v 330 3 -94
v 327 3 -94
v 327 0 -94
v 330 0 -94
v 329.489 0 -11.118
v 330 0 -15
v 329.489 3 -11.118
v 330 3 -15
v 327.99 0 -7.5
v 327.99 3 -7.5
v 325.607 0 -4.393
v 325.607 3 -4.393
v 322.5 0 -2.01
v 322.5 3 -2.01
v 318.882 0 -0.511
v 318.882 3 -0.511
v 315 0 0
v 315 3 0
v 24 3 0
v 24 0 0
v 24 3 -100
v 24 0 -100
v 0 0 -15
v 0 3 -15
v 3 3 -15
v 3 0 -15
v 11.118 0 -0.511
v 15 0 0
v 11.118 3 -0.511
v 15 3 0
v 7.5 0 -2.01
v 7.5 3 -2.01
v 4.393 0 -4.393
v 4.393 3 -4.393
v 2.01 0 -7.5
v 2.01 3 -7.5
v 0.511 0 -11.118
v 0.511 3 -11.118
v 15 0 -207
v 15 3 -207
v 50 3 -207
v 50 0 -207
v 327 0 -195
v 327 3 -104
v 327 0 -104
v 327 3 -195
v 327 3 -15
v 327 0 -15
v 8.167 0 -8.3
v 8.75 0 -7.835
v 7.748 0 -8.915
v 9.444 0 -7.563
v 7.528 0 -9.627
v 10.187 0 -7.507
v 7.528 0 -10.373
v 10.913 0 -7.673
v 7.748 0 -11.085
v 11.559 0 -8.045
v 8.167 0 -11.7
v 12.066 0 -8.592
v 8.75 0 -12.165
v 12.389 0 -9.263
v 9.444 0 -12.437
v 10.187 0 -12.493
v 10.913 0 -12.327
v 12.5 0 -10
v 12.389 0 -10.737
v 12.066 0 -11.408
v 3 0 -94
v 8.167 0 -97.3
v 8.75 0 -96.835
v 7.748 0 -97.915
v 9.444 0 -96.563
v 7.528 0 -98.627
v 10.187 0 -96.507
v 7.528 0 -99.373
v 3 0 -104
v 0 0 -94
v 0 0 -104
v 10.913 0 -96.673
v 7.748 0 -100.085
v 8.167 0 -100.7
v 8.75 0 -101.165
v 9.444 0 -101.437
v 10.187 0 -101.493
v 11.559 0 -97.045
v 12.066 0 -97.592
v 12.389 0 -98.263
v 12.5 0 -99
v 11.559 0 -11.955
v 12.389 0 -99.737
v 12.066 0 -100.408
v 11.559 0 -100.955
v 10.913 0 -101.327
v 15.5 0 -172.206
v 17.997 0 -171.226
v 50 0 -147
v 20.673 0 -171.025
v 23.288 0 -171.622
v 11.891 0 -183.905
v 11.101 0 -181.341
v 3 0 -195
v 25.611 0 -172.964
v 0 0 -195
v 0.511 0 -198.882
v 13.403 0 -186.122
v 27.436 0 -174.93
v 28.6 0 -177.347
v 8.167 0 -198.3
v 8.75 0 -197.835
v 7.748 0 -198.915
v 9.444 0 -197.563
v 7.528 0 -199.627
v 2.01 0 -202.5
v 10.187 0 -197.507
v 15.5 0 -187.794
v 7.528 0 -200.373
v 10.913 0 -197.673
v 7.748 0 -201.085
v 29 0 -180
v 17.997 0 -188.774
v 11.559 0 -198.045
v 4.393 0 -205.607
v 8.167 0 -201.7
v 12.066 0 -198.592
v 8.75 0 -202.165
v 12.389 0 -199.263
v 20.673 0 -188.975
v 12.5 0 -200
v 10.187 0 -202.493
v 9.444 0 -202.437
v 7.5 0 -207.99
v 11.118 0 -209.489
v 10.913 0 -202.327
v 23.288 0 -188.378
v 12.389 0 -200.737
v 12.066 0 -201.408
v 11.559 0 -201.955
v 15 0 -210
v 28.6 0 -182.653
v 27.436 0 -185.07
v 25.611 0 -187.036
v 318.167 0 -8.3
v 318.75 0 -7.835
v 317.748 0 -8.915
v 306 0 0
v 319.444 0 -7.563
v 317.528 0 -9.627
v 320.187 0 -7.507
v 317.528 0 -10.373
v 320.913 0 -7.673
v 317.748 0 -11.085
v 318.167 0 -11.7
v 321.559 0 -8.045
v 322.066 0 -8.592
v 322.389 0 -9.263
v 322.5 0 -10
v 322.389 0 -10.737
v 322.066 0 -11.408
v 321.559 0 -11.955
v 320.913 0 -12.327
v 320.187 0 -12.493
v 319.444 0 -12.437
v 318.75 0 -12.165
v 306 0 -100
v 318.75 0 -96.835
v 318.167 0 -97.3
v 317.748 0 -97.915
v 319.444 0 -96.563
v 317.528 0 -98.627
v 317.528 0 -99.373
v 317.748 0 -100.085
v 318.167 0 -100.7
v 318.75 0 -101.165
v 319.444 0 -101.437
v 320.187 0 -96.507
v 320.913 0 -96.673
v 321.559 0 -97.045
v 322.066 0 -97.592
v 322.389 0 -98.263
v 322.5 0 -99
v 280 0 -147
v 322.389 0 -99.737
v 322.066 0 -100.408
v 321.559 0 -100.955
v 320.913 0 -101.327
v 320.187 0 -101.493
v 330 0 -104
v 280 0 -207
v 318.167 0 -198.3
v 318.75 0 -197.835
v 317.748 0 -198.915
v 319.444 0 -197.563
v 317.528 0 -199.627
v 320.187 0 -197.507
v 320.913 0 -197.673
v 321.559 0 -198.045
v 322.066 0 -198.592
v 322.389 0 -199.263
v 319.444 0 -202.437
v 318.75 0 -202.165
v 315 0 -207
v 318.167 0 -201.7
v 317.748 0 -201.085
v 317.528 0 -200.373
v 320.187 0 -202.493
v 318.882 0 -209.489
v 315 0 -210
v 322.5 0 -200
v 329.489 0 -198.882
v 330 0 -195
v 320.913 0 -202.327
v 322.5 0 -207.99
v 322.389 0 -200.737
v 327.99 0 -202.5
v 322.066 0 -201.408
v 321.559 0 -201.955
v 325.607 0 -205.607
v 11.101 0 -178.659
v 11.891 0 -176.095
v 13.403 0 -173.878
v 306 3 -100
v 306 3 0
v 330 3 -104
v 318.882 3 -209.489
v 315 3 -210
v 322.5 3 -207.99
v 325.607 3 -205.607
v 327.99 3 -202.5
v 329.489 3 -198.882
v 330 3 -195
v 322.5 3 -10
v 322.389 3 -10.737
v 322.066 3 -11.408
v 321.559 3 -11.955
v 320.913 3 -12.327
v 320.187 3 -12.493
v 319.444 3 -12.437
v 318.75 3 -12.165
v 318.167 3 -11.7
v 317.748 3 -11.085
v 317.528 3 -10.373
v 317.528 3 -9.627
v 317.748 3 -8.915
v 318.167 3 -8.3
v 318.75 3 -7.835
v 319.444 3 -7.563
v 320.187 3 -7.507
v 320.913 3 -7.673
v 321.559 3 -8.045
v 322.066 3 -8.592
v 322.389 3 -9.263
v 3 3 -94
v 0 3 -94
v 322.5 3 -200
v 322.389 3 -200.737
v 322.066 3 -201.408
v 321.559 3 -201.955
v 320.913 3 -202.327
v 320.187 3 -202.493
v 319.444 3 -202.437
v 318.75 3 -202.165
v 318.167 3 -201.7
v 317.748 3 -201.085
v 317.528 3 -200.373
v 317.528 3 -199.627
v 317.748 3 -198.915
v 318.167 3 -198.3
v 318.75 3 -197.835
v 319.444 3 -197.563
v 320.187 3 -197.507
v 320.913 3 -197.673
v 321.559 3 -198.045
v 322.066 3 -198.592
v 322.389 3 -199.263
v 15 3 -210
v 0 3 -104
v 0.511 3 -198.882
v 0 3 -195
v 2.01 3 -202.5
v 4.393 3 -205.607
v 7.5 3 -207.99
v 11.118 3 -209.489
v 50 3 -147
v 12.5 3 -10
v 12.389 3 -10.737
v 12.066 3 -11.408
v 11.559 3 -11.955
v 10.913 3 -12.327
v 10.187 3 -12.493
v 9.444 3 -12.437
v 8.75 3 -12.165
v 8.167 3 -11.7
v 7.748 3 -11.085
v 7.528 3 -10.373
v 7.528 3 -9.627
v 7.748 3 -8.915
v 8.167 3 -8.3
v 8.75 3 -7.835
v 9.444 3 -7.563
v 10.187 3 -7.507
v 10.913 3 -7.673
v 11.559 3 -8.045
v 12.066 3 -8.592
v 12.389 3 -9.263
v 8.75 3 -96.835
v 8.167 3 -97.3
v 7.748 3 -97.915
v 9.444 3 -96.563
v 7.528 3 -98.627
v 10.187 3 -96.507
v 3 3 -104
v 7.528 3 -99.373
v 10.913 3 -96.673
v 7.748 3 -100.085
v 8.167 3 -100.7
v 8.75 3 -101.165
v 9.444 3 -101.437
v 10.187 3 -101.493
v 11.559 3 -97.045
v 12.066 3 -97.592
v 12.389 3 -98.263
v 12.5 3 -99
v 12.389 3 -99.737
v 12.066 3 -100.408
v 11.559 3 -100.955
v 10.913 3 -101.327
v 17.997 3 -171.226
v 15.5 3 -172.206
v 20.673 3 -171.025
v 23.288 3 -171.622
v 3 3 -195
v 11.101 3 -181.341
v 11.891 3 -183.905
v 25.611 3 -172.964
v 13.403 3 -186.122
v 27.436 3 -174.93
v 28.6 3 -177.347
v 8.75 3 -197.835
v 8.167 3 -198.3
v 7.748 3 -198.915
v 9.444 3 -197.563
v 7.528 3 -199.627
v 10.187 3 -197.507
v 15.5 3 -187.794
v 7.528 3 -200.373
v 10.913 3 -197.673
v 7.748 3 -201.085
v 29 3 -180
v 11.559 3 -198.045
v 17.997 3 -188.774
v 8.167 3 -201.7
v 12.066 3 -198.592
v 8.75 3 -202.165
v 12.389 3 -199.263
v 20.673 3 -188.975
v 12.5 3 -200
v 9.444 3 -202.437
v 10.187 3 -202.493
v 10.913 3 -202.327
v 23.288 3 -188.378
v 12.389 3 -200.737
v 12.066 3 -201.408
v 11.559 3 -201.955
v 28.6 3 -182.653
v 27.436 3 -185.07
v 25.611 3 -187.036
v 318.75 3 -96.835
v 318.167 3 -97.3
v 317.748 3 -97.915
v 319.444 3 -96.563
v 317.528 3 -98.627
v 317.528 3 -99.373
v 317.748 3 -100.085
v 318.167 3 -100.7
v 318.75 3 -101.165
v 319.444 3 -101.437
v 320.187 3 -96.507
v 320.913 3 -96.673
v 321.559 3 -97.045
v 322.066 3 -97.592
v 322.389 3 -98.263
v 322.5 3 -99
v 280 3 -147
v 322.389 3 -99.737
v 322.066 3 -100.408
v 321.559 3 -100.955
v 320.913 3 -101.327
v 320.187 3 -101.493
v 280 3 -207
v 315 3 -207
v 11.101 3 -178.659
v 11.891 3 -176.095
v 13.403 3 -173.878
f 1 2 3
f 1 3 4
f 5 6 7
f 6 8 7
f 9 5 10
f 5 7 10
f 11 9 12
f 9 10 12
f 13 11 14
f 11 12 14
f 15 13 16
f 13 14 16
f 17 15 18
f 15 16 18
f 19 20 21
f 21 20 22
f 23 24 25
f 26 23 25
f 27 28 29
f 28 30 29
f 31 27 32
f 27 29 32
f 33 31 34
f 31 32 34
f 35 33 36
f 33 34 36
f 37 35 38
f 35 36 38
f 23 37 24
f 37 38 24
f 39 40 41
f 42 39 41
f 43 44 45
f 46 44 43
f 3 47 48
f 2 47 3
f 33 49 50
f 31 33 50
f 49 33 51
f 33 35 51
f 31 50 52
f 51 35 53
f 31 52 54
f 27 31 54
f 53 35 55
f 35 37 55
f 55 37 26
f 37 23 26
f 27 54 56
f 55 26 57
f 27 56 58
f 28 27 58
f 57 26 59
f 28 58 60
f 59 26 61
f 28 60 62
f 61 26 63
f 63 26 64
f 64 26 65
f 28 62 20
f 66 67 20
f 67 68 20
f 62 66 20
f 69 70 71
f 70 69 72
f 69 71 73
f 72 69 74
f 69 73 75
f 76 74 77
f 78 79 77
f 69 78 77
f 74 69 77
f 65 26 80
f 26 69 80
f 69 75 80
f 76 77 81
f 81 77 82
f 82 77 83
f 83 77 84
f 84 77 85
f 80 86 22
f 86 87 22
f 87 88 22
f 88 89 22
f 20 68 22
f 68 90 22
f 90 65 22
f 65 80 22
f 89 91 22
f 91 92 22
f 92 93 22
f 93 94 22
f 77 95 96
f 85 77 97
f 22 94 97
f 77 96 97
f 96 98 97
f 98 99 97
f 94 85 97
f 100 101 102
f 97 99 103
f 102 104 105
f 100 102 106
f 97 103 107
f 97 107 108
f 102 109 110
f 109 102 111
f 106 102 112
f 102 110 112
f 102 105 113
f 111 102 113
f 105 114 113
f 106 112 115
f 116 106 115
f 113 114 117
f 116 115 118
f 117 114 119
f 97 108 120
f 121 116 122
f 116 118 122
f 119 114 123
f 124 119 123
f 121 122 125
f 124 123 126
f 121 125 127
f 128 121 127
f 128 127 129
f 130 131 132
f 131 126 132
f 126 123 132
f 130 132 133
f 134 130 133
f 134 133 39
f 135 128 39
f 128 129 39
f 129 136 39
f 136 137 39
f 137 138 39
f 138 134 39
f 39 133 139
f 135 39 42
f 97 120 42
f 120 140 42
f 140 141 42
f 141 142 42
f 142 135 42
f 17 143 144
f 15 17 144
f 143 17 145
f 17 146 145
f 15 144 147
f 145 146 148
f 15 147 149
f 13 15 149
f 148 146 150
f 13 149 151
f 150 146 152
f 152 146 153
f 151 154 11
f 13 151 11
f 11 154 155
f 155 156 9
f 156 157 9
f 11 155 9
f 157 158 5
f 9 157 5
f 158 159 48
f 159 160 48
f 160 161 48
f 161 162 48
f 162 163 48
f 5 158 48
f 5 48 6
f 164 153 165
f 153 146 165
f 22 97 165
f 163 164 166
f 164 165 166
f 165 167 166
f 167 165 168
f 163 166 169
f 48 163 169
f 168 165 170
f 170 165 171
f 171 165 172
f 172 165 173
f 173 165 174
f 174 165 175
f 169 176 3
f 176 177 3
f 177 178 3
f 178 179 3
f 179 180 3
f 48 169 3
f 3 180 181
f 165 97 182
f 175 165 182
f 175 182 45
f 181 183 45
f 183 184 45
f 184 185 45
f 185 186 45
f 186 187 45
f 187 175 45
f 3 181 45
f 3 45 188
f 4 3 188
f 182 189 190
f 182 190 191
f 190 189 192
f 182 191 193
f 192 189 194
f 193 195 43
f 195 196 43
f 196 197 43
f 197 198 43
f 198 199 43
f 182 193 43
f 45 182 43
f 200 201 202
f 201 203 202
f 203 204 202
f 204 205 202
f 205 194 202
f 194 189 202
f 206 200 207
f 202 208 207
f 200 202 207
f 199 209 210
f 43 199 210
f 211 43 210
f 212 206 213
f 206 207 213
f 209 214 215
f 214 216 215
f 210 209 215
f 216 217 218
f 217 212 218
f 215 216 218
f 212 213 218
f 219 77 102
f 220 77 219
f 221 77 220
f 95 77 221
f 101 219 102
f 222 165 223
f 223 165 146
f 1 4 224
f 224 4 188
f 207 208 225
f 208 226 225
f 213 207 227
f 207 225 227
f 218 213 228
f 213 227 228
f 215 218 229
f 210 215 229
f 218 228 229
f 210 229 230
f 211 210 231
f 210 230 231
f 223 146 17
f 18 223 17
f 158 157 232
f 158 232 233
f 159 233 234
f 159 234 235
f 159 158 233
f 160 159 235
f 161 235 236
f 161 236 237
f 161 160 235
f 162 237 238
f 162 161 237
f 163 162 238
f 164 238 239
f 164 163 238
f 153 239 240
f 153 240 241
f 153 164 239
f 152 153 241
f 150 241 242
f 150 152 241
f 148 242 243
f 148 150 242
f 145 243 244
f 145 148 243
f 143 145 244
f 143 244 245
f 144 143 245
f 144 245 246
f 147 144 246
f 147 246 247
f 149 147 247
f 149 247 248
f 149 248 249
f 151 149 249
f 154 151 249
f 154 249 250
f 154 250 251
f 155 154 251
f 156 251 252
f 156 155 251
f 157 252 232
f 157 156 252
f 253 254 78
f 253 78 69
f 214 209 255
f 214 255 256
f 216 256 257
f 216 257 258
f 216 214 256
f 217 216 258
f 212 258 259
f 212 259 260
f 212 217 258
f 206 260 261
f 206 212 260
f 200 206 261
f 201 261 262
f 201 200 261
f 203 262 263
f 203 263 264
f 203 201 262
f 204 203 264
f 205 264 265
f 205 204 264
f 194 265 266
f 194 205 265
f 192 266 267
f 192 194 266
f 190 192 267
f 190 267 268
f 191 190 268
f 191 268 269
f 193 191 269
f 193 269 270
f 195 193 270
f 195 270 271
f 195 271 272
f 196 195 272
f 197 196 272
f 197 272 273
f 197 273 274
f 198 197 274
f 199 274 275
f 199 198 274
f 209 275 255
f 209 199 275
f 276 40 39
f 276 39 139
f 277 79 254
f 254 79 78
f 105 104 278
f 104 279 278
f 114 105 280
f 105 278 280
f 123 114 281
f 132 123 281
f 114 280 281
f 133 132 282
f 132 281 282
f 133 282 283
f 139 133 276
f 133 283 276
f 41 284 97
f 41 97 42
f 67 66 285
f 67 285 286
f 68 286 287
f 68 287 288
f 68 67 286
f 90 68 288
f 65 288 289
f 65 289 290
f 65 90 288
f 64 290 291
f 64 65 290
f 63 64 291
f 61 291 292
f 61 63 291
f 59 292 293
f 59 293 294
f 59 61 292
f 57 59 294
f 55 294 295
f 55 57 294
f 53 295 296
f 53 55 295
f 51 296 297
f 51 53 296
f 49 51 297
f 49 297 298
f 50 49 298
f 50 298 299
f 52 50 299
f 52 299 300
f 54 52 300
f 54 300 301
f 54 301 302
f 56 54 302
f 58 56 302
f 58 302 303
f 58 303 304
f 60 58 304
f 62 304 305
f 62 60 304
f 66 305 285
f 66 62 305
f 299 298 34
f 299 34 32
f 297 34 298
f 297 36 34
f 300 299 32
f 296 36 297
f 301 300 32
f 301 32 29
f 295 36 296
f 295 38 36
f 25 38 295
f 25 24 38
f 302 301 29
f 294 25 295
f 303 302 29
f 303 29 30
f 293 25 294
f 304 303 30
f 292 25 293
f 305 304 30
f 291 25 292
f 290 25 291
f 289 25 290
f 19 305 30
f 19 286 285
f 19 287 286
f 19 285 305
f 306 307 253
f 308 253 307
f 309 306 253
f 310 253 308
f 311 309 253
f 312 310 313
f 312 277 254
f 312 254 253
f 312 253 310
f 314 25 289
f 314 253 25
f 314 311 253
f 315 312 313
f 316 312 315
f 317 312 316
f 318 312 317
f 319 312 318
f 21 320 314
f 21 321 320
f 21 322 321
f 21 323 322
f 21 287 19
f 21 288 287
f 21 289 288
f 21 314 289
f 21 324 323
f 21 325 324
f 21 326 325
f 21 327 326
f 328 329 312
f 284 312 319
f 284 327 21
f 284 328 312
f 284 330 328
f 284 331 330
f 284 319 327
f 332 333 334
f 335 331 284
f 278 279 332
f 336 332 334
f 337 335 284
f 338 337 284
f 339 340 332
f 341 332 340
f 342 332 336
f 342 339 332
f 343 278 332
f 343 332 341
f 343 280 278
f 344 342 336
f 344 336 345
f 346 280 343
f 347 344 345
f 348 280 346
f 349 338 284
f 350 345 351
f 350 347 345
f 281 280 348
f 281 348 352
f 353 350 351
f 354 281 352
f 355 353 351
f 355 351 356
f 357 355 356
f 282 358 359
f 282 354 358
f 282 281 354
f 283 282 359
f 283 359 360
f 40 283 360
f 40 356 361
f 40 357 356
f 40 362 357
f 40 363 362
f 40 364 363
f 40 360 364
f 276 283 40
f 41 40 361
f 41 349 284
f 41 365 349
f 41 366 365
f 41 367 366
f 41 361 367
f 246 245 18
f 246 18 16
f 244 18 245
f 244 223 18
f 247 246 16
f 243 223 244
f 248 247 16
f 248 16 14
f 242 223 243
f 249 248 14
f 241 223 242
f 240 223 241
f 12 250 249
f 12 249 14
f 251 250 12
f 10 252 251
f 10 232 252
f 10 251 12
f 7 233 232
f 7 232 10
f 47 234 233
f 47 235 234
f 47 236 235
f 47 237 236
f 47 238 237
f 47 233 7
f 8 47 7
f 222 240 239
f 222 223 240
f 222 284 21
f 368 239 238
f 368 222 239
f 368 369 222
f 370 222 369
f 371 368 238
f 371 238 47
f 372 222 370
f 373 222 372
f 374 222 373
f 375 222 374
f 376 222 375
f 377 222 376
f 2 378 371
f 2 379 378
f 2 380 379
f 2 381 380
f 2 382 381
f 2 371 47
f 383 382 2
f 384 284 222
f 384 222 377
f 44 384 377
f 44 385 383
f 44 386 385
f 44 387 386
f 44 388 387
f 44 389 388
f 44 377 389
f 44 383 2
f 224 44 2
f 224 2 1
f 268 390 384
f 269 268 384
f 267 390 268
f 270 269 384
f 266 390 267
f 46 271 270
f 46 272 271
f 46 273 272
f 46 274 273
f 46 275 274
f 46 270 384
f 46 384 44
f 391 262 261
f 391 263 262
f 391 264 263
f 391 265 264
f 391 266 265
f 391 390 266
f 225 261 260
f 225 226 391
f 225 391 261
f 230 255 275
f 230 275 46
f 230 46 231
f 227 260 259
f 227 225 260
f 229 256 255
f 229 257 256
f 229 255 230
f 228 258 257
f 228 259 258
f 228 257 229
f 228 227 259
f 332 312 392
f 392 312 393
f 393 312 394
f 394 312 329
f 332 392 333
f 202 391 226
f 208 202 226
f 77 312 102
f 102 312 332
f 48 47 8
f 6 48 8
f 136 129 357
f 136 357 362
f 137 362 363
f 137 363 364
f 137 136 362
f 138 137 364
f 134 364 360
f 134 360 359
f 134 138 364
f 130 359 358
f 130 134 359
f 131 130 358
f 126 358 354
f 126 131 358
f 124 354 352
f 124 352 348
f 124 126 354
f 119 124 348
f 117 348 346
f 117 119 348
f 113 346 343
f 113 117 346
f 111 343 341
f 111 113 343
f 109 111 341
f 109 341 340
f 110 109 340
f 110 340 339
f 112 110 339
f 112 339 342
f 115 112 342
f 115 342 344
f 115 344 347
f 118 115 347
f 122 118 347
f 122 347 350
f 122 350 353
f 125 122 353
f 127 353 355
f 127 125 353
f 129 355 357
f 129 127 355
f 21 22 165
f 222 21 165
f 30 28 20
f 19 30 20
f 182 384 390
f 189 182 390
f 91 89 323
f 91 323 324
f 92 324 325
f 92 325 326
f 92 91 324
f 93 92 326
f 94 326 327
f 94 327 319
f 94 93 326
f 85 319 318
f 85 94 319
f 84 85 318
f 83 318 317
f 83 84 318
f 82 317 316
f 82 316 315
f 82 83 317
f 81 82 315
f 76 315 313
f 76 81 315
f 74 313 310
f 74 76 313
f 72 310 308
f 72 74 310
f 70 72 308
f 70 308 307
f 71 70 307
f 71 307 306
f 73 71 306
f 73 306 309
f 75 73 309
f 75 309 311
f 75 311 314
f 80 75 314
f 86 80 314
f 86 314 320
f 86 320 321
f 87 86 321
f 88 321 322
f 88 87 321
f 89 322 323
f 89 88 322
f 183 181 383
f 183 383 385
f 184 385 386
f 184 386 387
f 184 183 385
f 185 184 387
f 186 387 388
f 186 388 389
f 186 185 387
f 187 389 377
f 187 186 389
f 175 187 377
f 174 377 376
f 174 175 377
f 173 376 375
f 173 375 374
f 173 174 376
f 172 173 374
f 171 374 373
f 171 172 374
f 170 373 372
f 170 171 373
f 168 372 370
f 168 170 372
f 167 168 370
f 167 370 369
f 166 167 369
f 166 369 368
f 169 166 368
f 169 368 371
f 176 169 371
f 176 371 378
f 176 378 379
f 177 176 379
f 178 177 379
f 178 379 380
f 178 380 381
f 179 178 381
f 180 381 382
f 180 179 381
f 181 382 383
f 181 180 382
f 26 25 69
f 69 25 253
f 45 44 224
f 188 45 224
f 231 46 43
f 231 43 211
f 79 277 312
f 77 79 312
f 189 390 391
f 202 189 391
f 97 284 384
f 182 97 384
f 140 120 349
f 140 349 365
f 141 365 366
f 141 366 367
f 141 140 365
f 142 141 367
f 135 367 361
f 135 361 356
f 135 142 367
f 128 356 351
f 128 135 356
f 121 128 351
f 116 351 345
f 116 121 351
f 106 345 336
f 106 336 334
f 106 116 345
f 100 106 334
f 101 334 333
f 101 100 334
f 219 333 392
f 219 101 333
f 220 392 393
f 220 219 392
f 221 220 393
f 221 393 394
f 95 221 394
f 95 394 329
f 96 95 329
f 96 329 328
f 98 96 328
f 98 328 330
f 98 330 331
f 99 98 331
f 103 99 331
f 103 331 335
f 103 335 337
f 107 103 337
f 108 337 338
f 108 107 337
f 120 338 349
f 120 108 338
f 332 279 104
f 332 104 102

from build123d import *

# Parameters (mm, degrees)
ESQUISSE1_R      = 2.5
ESQUISSE1_R_2    = 9
EXTRUSION1_DEPTH = 3
CONG_1_R         = 15
EXTRUSION2_REACH = 5
ESQUISSE2_W      = 300
ESQUISSE2_H      = 3
ESQUISSE2_W_2    = 3
ESQUISSE2_H_2    = 91
ESQUISSE2_H_3    = 79
EXTRUSION3_REACH = 5
ESQUISSE3_W      = 230
ESQUISSE3_H      = 60


with BuildPart() as part:
    # Esquisse1 → Extrusion1 (new body)
    with BuildSketch(Plane(origin=(0, 0, 0), x_dir=(1, 0, 0), z_dir=(0, 1, 0))):
        Polygon((0, 0), (24, 0), (24, 100), (165, 100), (306, 100), (306, 0), (330, 0), (330, 210), (0, 210), align=None)
        with Locations((10, 200)):
            Circle(ESQUISSE1_R, mode=Mode.SUBTRACT)
        with Locations((320, 200)):
            Circle(ESQUISSE1_R, mode=Mode.SUBTRACT)
        with Locations((10, 99)):
            Circle(ESQUISSE1_R, mode=Mode.SUBTRACT)
        with Locations((320, 99)):
            Circle(ESQUISSE1_R, mode=Mode.SUBTRACT)
        with Locations((10, 10)):
            Circle(ESQUISSE1_R, mode=Mode.SUBTRACT)
        with Locations((320, 10)):
            Circle(ESQUISSE1_R, mode=Mode.SUBTRACT)
        with Locations((20, 180)):
            Circle(ESQUISSE1_R_2, mode=Mode.SUBTRACT)
    extrude(amount=EXTRUSION1_DEPTH)

    # Congé1
    cong_1_edges = [part.edges().sort_by_distance(p)[0] for p in [
        (0, 1.5, -210),
        (330, 1.5, -210),
        (330, 1.5, 0),
        (0, 1.5, 0),
    ]]
    fillet(cong_1_edges, radius=CONG_1_R)

    # Esquisse2 → Extrusion2 (cut, up to next)
    with BuildSketch(Plane(origin=(0, 3, 0), x_dir=(1, 0, 0), z_dir=(0, 1, 0)), mode=Mode.PRIVATE) as extrusion2_sk1:
        with Locations((165, 208.5)):
            Rectangle(ESQUISSE2_W, ESQUISSE2_H)
    extrusion2_tool1 = extrude(extrusion2_sk1.sketch, amount=-EXTRUSION2_REACH, mode=Mode.PRIVATE) & part.part
    add(extrusion2_tool1.solids().sort_by_distance((165, 3, -208.5))[0], mode=Mode.SUBTRACT)
    # Esquisse2 → Extrusion2 (cut, up to next)
    with BuildSketch(Plane(origin=(0, 3, 0), x_dir=(1, 0, 0), z_dir=(0, 1, 0)), mode=Mode.PRIVATE) as extrusion2_sk2:
        with Locations((1.5, 149.5)):
            Rectangle(ESQUISSE2_W_2, ESQUISSE2_H_2)
    extrusion2_tool2 = extrude(extrusion2_sk2.sketch, amount=-EXTRUSION2_REACH, mode=Mode.PRIVATE) & part.part
    add(extrusion2_tool2.solids().sort_by_distance((1.5, 3, -149.5))[0], mode=Mode.SUBTRACT)
    # Esquisse2 → Extrusion2 (cut, up to next)
    with BuildSketch(Plane(origin=(0, 3, 0), x_dir=(1, 0, 0), z_dir=(0, 1, 0)), mode=Mode.PRIVATE) as extrusion2_sk3:
        with Locations((1.5, 54.5)):
            Rectangle(ESQUISSE2_W_2, ESQUISSE2_H_3)
    extrusion2_tool3 = extrude(extrusion2_sk3.sketch, amount=-EXTRUSION2_REACH, mode=Mode.PRIVATE) & part.part
    add(extrusion2_tool3.solids().sort_by_distance((1.5, 3, -54.5))[0], mode=Mode.SUBTRACT)
    # Esquisse2 → Extrusion2 (cut, up to next)
    with BuildSketch(Plane(origin=(0, 3, 0), x_dir=(1, 0, 0), z_dir=(0, 1, 0)), mode=Mode.PRIVATE) as extrusion2_sk4:
        with Locations((328.5, 54.5)):
            Rectangle(ESQUISSE2_W_2, ESQUISSE2_H_3)
    extrusion2_tool4 = extrude(extrusion2_sk4.sketch, amount=-EXTRUSION2_REACH, mode=Mode.PRIVATE) & part.part
    add(extrusion2_tool4.solids().sort_by_distance((328.5, 3, -54.5))[0], mode=Mode.SUBTRACT)
    # Esquisse2 → Extrusion2 (cut, up to next)
    with BuildSketch(Plane(origin=(0, 3, 0), x_dir=(1, 0, 0), z_dir=(0, 1, 0)), mode=Mode.PRIVATE) as extrusion2_sk5:
        with Locations((328.5, 149.5)):
            Rectangle(ESQUISSE2_W_2, ESQUISSE2_H_2)
    extrusion2_tool5 = extrude(extrusion2_sk5.sketch, amount=-EXTRUSION2_REACH, mode=Mode.PRIVATE) & part.part
    add(extrusion2_tool5.solids().sort_by_distance((328.5, 3, -149.5))[0], mode=Mode.SUBTRACT)

    # Esquisse3 → Extrusion3 (cut, up to next)
    with BuildSketch(Plane(origin=(0, 3, 0), x_dir=(1, 0, 0), z_dir=(0, 1, 0)), mode=Mode.PRIVATE) as extrusion3_sk1:
        with Locations((165, 177)):
            Rectangle(ESQUISSE3_W, ESQUISSE3_H)
    extrusion3_tool1 = extrude(extrusion3_sk1.sketch, amount=-EXTRUSION3_REACH, mode=Mode.PRIVATE) & part.part
    add(extrusion3_tool1.solids().sort_by_distance((165, 3, -177))[0], mode=Mode.SUBTRACT)


solid = part.part
